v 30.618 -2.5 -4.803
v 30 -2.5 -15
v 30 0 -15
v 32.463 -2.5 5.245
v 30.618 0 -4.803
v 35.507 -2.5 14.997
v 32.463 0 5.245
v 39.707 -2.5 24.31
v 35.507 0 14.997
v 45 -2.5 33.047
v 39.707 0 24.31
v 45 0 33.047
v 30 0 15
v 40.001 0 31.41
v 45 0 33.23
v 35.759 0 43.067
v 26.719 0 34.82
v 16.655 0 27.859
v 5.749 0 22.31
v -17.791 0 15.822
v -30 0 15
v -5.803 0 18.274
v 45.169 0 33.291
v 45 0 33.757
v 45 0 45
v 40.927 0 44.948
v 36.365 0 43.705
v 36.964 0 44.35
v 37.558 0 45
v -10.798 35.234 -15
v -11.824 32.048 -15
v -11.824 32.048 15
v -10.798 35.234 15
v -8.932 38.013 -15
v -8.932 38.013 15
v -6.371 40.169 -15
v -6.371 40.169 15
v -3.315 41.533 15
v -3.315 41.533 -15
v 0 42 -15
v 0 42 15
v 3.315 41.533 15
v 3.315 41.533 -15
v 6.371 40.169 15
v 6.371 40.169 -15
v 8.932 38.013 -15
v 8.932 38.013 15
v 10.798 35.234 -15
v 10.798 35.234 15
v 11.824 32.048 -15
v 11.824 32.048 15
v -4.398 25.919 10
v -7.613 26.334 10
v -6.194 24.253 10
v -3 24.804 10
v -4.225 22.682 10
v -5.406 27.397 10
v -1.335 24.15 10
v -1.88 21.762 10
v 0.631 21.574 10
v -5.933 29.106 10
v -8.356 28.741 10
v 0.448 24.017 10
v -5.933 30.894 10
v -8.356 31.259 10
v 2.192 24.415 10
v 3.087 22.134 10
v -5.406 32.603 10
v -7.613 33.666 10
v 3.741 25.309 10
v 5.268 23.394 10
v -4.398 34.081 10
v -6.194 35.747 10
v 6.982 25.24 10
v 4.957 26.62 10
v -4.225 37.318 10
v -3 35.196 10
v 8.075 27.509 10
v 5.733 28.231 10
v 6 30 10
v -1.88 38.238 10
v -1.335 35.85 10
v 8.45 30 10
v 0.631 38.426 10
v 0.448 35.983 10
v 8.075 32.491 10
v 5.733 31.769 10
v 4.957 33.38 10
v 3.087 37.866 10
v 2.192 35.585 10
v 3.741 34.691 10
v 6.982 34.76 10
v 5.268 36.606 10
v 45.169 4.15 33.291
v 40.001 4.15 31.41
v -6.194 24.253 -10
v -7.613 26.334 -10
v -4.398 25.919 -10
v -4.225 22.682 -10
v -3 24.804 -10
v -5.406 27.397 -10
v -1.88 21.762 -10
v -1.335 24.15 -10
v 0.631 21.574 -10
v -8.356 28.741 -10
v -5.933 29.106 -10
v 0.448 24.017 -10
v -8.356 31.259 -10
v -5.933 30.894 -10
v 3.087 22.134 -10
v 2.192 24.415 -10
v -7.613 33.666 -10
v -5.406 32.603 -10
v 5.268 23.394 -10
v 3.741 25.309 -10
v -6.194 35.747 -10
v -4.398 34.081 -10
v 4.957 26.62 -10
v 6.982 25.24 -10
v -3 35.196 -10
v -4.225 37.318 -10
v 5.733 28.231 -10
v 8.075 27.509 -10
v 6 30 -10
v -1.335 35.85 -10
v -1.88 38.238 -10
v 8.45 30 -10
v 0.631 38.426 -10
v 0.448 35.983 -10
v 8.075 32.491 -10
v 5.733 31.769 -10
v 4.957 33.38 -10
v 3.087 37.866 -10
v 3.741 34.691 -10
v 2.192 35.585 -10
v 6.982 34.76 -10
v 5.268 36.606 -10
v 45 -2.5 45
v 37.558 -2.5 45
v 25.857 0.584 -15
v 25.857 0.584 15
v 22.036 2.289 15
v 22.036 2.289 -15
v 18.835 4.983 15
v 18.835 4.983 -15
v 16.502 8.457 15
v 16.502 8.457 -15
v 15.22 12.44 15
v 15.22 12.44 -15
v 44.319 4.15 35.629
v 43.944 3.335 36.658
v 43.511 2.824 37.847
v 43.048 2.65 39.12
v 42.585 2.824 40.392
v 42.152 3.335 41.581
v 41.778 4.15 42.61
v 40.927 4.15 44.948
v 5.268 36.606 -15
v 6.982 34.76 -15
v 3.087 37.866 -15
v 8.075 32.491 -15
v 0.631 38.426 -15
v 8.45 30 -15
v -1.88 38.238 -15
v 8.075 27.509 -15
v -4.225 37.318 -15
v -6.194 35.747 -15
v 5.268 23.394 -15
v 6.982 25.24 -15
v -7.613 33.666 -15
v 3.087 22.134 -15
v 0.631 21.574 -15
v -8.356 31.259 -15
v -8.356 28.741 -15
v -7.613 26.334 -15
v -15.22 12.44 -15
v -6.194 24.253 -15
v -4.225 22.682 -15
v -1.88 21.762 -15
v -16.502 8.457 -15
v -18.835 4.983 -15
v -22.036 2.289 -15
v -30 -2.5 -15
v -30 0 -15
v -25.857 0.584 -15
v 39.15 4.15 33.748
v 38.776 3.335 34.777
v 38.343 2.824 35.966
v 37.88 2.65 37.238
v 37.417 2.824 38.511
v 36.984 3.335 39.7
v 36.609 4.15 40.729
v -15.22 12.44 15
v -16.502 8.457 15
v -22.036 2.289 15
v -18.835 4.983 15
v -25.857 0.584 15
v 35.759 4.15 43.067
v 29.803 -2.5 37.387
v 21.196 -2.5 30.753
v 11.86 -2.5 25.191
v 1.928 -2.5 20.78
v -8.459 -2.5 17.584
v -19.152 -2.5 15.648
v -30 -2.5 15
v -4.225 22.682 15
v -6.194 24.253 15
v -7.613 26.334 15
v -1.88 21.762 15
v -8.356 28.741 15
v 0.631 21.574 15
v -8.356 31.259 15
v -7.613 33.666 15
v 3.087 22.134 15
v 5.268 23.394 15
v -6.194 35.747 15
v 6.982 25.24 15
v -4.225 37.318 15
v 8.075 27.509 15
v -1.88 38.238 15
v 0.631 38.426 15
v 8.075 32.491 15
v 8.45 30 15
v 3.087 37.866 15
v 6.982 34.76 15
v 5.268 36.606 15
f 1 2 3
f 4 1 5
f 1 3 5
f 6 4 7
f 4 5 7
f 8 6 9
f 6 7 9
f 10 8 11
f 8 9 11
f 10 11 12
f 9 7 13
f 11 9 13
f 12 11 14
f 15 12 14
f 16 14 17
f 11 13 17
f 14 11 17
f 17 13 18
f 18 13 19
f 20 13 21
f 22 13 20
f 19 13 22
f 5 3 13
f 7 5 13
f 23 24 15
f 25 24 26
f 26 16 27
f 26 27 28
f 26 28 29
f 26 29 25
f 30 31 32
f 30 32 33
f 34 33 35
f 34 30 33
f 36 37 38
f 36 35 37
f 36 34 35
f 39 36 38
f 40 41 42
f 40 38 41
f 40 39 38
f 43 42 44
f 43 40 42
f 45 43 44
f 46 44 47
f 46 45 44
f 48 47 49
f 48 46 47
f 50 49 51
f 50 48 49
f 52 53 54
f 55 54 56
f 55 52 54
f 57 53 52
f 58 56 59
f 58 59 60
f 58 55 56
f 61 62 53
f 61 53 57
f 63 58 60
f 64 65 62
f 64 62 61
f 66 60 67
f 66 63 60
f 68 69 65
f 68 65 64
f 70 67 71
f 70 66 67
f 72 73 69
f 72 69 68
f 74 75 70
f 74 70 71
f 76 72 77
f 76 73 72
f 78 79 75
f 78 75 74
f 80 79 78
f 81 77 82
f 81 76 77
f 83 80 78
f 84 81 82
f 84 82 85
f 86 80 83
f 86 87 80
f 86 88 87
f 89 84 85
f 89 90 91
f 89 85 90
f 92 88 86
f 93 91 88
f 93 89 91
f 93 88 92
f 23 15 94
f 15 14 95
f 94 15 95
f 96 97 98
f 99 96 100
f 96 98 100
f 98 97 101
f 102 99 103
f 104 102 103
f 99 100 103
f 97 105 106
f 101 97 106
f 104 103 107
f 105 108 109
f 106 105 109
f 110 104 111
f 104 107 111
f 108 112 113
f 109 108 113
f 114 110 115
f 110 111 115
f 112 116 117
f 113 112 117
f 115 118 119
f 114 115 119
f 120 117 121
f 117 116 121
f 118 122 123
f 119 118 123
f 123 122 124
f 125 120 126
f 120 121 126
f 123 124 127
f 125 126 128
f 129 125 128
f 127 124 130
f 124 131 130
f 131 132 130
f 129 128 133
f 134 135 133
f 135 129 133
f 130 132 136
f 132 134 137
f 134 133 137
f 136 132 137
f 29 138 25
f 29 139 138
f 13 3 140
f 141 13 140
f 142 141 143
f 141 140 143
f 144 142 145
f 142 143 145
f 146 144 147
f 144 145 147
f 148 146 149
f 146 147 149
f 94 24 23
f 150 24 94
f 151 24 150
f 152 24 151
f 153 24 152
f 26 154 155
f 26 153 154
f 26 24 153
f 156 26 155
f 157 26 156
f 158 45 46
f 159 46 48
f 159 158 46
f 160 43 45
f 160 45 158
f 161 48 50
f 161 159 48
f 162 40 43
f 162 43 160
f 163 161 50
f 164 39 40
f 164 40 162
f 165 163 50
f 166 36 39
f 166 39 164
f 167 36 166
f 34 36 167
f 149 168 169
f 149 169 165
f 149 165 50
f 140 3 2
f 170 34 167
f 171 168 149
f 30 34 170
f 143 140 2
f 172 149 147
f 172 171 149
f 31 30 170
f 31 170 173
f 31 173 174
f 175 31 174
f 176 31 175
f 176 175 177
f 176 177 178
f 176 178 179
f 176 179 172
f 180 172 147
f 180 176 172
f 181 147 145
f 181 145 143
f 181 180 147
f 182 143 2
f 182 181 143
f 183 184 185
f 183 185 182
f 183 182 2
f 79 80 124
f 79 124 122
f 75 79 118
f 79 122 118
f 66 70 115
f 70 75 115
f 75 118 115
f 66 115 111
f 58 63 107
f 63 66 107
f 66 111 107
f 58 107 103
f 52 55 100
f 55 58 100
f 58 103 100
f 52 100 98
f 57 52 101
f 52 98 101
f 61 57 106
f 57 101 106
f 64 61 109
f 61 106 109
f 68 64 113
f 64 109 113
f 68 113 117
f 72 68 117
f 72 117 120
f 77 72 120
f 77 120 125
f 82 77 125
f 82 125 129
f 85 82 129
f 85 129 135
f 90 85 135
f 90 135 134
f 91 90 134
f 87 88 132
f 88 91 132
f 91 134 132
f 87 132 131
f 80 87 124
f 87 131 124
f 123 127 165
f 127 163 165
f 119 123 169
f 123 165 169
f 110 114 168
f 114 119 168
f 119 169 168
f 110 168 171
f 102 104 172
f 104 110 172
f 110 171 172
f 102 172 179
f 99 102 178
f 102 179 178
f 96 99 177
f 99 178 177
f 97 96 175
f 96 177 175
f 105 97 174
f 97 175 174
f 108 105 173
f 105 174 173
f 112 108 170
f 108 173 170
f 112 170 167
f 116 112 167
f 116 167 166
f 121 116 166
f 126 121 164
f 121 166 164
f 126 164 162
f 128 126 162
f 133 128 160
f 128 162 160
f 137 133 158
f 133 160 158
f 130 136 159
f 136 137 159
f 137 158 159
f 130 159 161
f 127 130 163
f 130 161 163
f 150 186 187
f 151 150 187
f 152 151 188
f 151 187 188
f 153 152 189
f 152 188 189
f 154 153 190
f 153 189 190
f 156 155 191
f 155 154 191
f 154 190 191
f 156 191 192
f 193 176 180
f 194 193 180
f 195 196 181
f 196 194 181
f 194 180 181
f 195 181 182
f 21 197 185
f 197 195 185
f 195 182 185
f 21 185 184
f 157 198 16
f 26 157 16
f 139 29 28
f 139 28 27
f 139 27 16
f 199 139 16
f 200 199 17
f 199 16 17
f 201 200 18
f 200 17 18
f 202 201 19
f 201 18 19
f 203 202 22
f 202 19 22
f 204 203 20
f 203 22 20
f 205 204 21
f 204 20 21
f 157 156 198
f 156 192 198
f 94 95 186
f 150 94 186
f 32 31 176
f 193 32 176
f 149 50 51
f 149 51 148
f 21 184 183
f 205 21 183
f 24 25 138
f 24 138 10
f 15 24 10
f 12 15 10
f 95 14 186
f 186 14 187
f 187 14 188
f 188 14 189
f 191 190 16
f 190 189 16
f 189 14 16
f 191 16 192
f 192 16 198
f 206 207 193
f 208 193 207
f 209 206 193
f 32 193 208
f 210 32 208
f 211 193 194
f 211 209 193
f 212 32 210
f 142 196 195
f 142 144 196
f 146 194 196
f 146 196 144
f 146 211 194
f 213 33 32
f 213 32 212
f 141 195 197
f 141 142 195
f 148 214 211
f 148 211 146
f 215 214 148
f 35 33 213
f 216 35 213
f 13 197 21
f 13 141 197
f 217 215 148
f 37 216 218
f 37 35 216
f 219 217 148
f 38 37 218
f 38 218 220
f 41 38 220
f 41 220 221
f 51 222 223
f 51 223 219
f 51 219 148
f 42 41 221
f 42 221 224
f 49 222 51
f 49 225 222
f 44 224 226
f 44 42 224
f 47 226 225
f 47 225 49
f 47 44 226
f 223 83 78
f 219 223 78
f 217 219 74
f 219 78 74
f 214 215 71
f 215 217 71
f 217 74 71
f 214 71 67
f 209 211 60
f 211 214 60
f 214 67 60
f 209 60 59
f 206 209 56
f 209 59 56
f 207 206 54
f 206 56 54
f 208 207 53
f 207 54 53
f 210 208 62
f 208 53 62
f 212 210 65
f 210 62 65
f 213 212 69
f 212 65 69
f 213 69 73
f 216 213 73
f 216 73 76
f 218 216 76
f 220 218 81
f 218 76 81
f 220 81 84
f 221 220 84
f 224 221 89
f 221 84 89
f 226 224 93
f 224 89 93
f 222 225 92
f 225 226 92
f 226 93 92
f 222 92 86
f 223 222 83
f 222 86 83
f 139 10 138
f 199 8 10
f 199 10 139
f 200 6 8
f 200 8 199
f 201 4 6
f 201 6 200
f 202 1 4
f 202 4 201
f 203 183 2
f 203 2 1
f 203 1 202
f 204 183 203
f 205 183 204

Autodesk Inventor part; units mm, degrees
ref_plane "YZ Plane" through (0, 0, 0) normal (1, 0, 0) x (0, 1, 0)
ref_plane "XZ Plane" through (0, 0, 0) normal (0, 1, 0) x (-1, 0, 0)
sketch "Sketch1" plane through (0, 0, 0) normal (0, 0, 1) x (1, 0, 0)
  circle A0 centre (0, 30) radius 8.45
  circle A1 centre (0, 30) radius 6
  arc A2 (-30, 0) -> (-15.2201, 12.4401) centre (-30, 15) ccw
  arc A3 (15.2201, 12.4401) -> (30, 0) centre (30, 15) ccw
  arc A4 (11.824, 32.0479) -> (-11.824, 32.0479) centre (0, 30) ccw
  line L0 (-11.824, 32.0479) -> (-15.2201, 12.4401)
  line L1 (11.824, 32.0479) -> (15.2201, 12.4401)
  line L2 (30, 0) -> (-30, 0)
  line L3 (-30, 0) -> (-30, -2.5)
  line L4 (-30, -2.5) -> (30, -2.5)
  line L5 (30, -2.5) -> (30, 0)
  point P0 (0, 0)
  point P1 (0, 0)
  dimension "d2" = 16.9
  dimension "d3" = 12
  dimension "d9" = 30
  dimension "d12" = 12
  dimension "d15" = 15
  dimension "d16" = 60
  dimension "d17" = 2.5
extrude "Extrusion3" add sketch "Sketch1" along normal mid plane 30 contours A2 L0 A4 L1 A3 L2
extrude "Extrusion4" add sketch "Sketch1" along normal mid plane 20 contours A0
extrude "Extrusion5" add sketch "Sketch1" against normal blind 15 contours L2 L5 L4 L3
extrude "Extrusion6" add sketch "Sketch1" along normal blind 45 contours L2 L5 L4 L3
ref_plane "Work Plane1" through (30, -2.5, 45) normal (0.9397, 0, 0.342) x (0, 1, 0)
ref_plane "Work Plane3" through (37.0477, -2.5, 47.5652) normal (0.9397, 0, 0.342) x (0, 1, 0)
sketch "Sketch5" plane through (37.0477, -2.5, 47.5652) normal (0.9397, 0, 0.342) x (0, 1, 0)
  line L0 (2.5, -28.1908) -> (2.5, -16.1908) construction
  circle A0 centre (10.5, -9.9886) radius 5.35
  circle A1 centre (10.5, -9.9886) radius 7.3 construction
  line L1 (2.5, -16.1908) -> (6.65, -16.1908)
  line L2 (6.65, -16.1908) -> (6.65, -3.7863)
  line L3 (6.65, -3.7863) -> (2.5, -3.7863)
  line L4 (2.5, -3.7863) -> (2.5, -16.1908)
  point P0 (6.65, -13.7034)
  point P1 (6.65, -6.2737)
  dimension "d46" = 12
  dimension "d47" = 10.7
  dimension "d48" = 14.6
  dimension "d49" = 8
  dimension "d51" = 1.5
extrude "Extrusion9" add sketch "Sketch5" along normal mid plane 5.5 contours A0 L2 L1 L4 L3
sketch "Sketch6" plane through (30, -2.5, -15) normal (1, 0, 0) x (0, 0, -1)
  line L0 (0, 0) -> (-60, 0) projected
  line L1 (0, 2.5) -> (0, 0) projected
  line L2 (0, 2.5) -> (-30, 2.5) projected
  line L3 (-30, 2.5) -> (-60, 2.5) projected
  line L4 (-60, 0) -> (-60, 2.5) projected
  point P0 (-15, 2.5)
extrude "Extrusion10" add sketch "Sketch6" along normal blind 15
sketch "Sketch7" plane through (-30, 0, 15) normal (0, 1, 0) x (1, 0, 0)
  line L0 (0, 30) -> (0, -30) projected
  arc A0 (67.5578, -30) -> (0, 0) centre (0, -91.0677) ccw
  line L1 (0, -30) -> (75, -30) projected
  line L2 (0, 0) -> (60, 0) projected
  arc A1 (60, 30) -> (75, -18.0474) centre (144.4517, 30) ccw
  line L3 (60, 30) -> (60, 0) projected
  line L4 (75, 30) -> (75, -30) projected
  line L5 (60, 30) -> (75, 30) projected
  point P0 (30, 15)
  point P1 (65.7585, -28.0666)
  point P2 (75.1694, -18.2914)
extrude "Extrusion11" cut sketch "Sketch7" against normal through all contours A0 L1 L0 | L5 L4 A1
properties part number "Support"
